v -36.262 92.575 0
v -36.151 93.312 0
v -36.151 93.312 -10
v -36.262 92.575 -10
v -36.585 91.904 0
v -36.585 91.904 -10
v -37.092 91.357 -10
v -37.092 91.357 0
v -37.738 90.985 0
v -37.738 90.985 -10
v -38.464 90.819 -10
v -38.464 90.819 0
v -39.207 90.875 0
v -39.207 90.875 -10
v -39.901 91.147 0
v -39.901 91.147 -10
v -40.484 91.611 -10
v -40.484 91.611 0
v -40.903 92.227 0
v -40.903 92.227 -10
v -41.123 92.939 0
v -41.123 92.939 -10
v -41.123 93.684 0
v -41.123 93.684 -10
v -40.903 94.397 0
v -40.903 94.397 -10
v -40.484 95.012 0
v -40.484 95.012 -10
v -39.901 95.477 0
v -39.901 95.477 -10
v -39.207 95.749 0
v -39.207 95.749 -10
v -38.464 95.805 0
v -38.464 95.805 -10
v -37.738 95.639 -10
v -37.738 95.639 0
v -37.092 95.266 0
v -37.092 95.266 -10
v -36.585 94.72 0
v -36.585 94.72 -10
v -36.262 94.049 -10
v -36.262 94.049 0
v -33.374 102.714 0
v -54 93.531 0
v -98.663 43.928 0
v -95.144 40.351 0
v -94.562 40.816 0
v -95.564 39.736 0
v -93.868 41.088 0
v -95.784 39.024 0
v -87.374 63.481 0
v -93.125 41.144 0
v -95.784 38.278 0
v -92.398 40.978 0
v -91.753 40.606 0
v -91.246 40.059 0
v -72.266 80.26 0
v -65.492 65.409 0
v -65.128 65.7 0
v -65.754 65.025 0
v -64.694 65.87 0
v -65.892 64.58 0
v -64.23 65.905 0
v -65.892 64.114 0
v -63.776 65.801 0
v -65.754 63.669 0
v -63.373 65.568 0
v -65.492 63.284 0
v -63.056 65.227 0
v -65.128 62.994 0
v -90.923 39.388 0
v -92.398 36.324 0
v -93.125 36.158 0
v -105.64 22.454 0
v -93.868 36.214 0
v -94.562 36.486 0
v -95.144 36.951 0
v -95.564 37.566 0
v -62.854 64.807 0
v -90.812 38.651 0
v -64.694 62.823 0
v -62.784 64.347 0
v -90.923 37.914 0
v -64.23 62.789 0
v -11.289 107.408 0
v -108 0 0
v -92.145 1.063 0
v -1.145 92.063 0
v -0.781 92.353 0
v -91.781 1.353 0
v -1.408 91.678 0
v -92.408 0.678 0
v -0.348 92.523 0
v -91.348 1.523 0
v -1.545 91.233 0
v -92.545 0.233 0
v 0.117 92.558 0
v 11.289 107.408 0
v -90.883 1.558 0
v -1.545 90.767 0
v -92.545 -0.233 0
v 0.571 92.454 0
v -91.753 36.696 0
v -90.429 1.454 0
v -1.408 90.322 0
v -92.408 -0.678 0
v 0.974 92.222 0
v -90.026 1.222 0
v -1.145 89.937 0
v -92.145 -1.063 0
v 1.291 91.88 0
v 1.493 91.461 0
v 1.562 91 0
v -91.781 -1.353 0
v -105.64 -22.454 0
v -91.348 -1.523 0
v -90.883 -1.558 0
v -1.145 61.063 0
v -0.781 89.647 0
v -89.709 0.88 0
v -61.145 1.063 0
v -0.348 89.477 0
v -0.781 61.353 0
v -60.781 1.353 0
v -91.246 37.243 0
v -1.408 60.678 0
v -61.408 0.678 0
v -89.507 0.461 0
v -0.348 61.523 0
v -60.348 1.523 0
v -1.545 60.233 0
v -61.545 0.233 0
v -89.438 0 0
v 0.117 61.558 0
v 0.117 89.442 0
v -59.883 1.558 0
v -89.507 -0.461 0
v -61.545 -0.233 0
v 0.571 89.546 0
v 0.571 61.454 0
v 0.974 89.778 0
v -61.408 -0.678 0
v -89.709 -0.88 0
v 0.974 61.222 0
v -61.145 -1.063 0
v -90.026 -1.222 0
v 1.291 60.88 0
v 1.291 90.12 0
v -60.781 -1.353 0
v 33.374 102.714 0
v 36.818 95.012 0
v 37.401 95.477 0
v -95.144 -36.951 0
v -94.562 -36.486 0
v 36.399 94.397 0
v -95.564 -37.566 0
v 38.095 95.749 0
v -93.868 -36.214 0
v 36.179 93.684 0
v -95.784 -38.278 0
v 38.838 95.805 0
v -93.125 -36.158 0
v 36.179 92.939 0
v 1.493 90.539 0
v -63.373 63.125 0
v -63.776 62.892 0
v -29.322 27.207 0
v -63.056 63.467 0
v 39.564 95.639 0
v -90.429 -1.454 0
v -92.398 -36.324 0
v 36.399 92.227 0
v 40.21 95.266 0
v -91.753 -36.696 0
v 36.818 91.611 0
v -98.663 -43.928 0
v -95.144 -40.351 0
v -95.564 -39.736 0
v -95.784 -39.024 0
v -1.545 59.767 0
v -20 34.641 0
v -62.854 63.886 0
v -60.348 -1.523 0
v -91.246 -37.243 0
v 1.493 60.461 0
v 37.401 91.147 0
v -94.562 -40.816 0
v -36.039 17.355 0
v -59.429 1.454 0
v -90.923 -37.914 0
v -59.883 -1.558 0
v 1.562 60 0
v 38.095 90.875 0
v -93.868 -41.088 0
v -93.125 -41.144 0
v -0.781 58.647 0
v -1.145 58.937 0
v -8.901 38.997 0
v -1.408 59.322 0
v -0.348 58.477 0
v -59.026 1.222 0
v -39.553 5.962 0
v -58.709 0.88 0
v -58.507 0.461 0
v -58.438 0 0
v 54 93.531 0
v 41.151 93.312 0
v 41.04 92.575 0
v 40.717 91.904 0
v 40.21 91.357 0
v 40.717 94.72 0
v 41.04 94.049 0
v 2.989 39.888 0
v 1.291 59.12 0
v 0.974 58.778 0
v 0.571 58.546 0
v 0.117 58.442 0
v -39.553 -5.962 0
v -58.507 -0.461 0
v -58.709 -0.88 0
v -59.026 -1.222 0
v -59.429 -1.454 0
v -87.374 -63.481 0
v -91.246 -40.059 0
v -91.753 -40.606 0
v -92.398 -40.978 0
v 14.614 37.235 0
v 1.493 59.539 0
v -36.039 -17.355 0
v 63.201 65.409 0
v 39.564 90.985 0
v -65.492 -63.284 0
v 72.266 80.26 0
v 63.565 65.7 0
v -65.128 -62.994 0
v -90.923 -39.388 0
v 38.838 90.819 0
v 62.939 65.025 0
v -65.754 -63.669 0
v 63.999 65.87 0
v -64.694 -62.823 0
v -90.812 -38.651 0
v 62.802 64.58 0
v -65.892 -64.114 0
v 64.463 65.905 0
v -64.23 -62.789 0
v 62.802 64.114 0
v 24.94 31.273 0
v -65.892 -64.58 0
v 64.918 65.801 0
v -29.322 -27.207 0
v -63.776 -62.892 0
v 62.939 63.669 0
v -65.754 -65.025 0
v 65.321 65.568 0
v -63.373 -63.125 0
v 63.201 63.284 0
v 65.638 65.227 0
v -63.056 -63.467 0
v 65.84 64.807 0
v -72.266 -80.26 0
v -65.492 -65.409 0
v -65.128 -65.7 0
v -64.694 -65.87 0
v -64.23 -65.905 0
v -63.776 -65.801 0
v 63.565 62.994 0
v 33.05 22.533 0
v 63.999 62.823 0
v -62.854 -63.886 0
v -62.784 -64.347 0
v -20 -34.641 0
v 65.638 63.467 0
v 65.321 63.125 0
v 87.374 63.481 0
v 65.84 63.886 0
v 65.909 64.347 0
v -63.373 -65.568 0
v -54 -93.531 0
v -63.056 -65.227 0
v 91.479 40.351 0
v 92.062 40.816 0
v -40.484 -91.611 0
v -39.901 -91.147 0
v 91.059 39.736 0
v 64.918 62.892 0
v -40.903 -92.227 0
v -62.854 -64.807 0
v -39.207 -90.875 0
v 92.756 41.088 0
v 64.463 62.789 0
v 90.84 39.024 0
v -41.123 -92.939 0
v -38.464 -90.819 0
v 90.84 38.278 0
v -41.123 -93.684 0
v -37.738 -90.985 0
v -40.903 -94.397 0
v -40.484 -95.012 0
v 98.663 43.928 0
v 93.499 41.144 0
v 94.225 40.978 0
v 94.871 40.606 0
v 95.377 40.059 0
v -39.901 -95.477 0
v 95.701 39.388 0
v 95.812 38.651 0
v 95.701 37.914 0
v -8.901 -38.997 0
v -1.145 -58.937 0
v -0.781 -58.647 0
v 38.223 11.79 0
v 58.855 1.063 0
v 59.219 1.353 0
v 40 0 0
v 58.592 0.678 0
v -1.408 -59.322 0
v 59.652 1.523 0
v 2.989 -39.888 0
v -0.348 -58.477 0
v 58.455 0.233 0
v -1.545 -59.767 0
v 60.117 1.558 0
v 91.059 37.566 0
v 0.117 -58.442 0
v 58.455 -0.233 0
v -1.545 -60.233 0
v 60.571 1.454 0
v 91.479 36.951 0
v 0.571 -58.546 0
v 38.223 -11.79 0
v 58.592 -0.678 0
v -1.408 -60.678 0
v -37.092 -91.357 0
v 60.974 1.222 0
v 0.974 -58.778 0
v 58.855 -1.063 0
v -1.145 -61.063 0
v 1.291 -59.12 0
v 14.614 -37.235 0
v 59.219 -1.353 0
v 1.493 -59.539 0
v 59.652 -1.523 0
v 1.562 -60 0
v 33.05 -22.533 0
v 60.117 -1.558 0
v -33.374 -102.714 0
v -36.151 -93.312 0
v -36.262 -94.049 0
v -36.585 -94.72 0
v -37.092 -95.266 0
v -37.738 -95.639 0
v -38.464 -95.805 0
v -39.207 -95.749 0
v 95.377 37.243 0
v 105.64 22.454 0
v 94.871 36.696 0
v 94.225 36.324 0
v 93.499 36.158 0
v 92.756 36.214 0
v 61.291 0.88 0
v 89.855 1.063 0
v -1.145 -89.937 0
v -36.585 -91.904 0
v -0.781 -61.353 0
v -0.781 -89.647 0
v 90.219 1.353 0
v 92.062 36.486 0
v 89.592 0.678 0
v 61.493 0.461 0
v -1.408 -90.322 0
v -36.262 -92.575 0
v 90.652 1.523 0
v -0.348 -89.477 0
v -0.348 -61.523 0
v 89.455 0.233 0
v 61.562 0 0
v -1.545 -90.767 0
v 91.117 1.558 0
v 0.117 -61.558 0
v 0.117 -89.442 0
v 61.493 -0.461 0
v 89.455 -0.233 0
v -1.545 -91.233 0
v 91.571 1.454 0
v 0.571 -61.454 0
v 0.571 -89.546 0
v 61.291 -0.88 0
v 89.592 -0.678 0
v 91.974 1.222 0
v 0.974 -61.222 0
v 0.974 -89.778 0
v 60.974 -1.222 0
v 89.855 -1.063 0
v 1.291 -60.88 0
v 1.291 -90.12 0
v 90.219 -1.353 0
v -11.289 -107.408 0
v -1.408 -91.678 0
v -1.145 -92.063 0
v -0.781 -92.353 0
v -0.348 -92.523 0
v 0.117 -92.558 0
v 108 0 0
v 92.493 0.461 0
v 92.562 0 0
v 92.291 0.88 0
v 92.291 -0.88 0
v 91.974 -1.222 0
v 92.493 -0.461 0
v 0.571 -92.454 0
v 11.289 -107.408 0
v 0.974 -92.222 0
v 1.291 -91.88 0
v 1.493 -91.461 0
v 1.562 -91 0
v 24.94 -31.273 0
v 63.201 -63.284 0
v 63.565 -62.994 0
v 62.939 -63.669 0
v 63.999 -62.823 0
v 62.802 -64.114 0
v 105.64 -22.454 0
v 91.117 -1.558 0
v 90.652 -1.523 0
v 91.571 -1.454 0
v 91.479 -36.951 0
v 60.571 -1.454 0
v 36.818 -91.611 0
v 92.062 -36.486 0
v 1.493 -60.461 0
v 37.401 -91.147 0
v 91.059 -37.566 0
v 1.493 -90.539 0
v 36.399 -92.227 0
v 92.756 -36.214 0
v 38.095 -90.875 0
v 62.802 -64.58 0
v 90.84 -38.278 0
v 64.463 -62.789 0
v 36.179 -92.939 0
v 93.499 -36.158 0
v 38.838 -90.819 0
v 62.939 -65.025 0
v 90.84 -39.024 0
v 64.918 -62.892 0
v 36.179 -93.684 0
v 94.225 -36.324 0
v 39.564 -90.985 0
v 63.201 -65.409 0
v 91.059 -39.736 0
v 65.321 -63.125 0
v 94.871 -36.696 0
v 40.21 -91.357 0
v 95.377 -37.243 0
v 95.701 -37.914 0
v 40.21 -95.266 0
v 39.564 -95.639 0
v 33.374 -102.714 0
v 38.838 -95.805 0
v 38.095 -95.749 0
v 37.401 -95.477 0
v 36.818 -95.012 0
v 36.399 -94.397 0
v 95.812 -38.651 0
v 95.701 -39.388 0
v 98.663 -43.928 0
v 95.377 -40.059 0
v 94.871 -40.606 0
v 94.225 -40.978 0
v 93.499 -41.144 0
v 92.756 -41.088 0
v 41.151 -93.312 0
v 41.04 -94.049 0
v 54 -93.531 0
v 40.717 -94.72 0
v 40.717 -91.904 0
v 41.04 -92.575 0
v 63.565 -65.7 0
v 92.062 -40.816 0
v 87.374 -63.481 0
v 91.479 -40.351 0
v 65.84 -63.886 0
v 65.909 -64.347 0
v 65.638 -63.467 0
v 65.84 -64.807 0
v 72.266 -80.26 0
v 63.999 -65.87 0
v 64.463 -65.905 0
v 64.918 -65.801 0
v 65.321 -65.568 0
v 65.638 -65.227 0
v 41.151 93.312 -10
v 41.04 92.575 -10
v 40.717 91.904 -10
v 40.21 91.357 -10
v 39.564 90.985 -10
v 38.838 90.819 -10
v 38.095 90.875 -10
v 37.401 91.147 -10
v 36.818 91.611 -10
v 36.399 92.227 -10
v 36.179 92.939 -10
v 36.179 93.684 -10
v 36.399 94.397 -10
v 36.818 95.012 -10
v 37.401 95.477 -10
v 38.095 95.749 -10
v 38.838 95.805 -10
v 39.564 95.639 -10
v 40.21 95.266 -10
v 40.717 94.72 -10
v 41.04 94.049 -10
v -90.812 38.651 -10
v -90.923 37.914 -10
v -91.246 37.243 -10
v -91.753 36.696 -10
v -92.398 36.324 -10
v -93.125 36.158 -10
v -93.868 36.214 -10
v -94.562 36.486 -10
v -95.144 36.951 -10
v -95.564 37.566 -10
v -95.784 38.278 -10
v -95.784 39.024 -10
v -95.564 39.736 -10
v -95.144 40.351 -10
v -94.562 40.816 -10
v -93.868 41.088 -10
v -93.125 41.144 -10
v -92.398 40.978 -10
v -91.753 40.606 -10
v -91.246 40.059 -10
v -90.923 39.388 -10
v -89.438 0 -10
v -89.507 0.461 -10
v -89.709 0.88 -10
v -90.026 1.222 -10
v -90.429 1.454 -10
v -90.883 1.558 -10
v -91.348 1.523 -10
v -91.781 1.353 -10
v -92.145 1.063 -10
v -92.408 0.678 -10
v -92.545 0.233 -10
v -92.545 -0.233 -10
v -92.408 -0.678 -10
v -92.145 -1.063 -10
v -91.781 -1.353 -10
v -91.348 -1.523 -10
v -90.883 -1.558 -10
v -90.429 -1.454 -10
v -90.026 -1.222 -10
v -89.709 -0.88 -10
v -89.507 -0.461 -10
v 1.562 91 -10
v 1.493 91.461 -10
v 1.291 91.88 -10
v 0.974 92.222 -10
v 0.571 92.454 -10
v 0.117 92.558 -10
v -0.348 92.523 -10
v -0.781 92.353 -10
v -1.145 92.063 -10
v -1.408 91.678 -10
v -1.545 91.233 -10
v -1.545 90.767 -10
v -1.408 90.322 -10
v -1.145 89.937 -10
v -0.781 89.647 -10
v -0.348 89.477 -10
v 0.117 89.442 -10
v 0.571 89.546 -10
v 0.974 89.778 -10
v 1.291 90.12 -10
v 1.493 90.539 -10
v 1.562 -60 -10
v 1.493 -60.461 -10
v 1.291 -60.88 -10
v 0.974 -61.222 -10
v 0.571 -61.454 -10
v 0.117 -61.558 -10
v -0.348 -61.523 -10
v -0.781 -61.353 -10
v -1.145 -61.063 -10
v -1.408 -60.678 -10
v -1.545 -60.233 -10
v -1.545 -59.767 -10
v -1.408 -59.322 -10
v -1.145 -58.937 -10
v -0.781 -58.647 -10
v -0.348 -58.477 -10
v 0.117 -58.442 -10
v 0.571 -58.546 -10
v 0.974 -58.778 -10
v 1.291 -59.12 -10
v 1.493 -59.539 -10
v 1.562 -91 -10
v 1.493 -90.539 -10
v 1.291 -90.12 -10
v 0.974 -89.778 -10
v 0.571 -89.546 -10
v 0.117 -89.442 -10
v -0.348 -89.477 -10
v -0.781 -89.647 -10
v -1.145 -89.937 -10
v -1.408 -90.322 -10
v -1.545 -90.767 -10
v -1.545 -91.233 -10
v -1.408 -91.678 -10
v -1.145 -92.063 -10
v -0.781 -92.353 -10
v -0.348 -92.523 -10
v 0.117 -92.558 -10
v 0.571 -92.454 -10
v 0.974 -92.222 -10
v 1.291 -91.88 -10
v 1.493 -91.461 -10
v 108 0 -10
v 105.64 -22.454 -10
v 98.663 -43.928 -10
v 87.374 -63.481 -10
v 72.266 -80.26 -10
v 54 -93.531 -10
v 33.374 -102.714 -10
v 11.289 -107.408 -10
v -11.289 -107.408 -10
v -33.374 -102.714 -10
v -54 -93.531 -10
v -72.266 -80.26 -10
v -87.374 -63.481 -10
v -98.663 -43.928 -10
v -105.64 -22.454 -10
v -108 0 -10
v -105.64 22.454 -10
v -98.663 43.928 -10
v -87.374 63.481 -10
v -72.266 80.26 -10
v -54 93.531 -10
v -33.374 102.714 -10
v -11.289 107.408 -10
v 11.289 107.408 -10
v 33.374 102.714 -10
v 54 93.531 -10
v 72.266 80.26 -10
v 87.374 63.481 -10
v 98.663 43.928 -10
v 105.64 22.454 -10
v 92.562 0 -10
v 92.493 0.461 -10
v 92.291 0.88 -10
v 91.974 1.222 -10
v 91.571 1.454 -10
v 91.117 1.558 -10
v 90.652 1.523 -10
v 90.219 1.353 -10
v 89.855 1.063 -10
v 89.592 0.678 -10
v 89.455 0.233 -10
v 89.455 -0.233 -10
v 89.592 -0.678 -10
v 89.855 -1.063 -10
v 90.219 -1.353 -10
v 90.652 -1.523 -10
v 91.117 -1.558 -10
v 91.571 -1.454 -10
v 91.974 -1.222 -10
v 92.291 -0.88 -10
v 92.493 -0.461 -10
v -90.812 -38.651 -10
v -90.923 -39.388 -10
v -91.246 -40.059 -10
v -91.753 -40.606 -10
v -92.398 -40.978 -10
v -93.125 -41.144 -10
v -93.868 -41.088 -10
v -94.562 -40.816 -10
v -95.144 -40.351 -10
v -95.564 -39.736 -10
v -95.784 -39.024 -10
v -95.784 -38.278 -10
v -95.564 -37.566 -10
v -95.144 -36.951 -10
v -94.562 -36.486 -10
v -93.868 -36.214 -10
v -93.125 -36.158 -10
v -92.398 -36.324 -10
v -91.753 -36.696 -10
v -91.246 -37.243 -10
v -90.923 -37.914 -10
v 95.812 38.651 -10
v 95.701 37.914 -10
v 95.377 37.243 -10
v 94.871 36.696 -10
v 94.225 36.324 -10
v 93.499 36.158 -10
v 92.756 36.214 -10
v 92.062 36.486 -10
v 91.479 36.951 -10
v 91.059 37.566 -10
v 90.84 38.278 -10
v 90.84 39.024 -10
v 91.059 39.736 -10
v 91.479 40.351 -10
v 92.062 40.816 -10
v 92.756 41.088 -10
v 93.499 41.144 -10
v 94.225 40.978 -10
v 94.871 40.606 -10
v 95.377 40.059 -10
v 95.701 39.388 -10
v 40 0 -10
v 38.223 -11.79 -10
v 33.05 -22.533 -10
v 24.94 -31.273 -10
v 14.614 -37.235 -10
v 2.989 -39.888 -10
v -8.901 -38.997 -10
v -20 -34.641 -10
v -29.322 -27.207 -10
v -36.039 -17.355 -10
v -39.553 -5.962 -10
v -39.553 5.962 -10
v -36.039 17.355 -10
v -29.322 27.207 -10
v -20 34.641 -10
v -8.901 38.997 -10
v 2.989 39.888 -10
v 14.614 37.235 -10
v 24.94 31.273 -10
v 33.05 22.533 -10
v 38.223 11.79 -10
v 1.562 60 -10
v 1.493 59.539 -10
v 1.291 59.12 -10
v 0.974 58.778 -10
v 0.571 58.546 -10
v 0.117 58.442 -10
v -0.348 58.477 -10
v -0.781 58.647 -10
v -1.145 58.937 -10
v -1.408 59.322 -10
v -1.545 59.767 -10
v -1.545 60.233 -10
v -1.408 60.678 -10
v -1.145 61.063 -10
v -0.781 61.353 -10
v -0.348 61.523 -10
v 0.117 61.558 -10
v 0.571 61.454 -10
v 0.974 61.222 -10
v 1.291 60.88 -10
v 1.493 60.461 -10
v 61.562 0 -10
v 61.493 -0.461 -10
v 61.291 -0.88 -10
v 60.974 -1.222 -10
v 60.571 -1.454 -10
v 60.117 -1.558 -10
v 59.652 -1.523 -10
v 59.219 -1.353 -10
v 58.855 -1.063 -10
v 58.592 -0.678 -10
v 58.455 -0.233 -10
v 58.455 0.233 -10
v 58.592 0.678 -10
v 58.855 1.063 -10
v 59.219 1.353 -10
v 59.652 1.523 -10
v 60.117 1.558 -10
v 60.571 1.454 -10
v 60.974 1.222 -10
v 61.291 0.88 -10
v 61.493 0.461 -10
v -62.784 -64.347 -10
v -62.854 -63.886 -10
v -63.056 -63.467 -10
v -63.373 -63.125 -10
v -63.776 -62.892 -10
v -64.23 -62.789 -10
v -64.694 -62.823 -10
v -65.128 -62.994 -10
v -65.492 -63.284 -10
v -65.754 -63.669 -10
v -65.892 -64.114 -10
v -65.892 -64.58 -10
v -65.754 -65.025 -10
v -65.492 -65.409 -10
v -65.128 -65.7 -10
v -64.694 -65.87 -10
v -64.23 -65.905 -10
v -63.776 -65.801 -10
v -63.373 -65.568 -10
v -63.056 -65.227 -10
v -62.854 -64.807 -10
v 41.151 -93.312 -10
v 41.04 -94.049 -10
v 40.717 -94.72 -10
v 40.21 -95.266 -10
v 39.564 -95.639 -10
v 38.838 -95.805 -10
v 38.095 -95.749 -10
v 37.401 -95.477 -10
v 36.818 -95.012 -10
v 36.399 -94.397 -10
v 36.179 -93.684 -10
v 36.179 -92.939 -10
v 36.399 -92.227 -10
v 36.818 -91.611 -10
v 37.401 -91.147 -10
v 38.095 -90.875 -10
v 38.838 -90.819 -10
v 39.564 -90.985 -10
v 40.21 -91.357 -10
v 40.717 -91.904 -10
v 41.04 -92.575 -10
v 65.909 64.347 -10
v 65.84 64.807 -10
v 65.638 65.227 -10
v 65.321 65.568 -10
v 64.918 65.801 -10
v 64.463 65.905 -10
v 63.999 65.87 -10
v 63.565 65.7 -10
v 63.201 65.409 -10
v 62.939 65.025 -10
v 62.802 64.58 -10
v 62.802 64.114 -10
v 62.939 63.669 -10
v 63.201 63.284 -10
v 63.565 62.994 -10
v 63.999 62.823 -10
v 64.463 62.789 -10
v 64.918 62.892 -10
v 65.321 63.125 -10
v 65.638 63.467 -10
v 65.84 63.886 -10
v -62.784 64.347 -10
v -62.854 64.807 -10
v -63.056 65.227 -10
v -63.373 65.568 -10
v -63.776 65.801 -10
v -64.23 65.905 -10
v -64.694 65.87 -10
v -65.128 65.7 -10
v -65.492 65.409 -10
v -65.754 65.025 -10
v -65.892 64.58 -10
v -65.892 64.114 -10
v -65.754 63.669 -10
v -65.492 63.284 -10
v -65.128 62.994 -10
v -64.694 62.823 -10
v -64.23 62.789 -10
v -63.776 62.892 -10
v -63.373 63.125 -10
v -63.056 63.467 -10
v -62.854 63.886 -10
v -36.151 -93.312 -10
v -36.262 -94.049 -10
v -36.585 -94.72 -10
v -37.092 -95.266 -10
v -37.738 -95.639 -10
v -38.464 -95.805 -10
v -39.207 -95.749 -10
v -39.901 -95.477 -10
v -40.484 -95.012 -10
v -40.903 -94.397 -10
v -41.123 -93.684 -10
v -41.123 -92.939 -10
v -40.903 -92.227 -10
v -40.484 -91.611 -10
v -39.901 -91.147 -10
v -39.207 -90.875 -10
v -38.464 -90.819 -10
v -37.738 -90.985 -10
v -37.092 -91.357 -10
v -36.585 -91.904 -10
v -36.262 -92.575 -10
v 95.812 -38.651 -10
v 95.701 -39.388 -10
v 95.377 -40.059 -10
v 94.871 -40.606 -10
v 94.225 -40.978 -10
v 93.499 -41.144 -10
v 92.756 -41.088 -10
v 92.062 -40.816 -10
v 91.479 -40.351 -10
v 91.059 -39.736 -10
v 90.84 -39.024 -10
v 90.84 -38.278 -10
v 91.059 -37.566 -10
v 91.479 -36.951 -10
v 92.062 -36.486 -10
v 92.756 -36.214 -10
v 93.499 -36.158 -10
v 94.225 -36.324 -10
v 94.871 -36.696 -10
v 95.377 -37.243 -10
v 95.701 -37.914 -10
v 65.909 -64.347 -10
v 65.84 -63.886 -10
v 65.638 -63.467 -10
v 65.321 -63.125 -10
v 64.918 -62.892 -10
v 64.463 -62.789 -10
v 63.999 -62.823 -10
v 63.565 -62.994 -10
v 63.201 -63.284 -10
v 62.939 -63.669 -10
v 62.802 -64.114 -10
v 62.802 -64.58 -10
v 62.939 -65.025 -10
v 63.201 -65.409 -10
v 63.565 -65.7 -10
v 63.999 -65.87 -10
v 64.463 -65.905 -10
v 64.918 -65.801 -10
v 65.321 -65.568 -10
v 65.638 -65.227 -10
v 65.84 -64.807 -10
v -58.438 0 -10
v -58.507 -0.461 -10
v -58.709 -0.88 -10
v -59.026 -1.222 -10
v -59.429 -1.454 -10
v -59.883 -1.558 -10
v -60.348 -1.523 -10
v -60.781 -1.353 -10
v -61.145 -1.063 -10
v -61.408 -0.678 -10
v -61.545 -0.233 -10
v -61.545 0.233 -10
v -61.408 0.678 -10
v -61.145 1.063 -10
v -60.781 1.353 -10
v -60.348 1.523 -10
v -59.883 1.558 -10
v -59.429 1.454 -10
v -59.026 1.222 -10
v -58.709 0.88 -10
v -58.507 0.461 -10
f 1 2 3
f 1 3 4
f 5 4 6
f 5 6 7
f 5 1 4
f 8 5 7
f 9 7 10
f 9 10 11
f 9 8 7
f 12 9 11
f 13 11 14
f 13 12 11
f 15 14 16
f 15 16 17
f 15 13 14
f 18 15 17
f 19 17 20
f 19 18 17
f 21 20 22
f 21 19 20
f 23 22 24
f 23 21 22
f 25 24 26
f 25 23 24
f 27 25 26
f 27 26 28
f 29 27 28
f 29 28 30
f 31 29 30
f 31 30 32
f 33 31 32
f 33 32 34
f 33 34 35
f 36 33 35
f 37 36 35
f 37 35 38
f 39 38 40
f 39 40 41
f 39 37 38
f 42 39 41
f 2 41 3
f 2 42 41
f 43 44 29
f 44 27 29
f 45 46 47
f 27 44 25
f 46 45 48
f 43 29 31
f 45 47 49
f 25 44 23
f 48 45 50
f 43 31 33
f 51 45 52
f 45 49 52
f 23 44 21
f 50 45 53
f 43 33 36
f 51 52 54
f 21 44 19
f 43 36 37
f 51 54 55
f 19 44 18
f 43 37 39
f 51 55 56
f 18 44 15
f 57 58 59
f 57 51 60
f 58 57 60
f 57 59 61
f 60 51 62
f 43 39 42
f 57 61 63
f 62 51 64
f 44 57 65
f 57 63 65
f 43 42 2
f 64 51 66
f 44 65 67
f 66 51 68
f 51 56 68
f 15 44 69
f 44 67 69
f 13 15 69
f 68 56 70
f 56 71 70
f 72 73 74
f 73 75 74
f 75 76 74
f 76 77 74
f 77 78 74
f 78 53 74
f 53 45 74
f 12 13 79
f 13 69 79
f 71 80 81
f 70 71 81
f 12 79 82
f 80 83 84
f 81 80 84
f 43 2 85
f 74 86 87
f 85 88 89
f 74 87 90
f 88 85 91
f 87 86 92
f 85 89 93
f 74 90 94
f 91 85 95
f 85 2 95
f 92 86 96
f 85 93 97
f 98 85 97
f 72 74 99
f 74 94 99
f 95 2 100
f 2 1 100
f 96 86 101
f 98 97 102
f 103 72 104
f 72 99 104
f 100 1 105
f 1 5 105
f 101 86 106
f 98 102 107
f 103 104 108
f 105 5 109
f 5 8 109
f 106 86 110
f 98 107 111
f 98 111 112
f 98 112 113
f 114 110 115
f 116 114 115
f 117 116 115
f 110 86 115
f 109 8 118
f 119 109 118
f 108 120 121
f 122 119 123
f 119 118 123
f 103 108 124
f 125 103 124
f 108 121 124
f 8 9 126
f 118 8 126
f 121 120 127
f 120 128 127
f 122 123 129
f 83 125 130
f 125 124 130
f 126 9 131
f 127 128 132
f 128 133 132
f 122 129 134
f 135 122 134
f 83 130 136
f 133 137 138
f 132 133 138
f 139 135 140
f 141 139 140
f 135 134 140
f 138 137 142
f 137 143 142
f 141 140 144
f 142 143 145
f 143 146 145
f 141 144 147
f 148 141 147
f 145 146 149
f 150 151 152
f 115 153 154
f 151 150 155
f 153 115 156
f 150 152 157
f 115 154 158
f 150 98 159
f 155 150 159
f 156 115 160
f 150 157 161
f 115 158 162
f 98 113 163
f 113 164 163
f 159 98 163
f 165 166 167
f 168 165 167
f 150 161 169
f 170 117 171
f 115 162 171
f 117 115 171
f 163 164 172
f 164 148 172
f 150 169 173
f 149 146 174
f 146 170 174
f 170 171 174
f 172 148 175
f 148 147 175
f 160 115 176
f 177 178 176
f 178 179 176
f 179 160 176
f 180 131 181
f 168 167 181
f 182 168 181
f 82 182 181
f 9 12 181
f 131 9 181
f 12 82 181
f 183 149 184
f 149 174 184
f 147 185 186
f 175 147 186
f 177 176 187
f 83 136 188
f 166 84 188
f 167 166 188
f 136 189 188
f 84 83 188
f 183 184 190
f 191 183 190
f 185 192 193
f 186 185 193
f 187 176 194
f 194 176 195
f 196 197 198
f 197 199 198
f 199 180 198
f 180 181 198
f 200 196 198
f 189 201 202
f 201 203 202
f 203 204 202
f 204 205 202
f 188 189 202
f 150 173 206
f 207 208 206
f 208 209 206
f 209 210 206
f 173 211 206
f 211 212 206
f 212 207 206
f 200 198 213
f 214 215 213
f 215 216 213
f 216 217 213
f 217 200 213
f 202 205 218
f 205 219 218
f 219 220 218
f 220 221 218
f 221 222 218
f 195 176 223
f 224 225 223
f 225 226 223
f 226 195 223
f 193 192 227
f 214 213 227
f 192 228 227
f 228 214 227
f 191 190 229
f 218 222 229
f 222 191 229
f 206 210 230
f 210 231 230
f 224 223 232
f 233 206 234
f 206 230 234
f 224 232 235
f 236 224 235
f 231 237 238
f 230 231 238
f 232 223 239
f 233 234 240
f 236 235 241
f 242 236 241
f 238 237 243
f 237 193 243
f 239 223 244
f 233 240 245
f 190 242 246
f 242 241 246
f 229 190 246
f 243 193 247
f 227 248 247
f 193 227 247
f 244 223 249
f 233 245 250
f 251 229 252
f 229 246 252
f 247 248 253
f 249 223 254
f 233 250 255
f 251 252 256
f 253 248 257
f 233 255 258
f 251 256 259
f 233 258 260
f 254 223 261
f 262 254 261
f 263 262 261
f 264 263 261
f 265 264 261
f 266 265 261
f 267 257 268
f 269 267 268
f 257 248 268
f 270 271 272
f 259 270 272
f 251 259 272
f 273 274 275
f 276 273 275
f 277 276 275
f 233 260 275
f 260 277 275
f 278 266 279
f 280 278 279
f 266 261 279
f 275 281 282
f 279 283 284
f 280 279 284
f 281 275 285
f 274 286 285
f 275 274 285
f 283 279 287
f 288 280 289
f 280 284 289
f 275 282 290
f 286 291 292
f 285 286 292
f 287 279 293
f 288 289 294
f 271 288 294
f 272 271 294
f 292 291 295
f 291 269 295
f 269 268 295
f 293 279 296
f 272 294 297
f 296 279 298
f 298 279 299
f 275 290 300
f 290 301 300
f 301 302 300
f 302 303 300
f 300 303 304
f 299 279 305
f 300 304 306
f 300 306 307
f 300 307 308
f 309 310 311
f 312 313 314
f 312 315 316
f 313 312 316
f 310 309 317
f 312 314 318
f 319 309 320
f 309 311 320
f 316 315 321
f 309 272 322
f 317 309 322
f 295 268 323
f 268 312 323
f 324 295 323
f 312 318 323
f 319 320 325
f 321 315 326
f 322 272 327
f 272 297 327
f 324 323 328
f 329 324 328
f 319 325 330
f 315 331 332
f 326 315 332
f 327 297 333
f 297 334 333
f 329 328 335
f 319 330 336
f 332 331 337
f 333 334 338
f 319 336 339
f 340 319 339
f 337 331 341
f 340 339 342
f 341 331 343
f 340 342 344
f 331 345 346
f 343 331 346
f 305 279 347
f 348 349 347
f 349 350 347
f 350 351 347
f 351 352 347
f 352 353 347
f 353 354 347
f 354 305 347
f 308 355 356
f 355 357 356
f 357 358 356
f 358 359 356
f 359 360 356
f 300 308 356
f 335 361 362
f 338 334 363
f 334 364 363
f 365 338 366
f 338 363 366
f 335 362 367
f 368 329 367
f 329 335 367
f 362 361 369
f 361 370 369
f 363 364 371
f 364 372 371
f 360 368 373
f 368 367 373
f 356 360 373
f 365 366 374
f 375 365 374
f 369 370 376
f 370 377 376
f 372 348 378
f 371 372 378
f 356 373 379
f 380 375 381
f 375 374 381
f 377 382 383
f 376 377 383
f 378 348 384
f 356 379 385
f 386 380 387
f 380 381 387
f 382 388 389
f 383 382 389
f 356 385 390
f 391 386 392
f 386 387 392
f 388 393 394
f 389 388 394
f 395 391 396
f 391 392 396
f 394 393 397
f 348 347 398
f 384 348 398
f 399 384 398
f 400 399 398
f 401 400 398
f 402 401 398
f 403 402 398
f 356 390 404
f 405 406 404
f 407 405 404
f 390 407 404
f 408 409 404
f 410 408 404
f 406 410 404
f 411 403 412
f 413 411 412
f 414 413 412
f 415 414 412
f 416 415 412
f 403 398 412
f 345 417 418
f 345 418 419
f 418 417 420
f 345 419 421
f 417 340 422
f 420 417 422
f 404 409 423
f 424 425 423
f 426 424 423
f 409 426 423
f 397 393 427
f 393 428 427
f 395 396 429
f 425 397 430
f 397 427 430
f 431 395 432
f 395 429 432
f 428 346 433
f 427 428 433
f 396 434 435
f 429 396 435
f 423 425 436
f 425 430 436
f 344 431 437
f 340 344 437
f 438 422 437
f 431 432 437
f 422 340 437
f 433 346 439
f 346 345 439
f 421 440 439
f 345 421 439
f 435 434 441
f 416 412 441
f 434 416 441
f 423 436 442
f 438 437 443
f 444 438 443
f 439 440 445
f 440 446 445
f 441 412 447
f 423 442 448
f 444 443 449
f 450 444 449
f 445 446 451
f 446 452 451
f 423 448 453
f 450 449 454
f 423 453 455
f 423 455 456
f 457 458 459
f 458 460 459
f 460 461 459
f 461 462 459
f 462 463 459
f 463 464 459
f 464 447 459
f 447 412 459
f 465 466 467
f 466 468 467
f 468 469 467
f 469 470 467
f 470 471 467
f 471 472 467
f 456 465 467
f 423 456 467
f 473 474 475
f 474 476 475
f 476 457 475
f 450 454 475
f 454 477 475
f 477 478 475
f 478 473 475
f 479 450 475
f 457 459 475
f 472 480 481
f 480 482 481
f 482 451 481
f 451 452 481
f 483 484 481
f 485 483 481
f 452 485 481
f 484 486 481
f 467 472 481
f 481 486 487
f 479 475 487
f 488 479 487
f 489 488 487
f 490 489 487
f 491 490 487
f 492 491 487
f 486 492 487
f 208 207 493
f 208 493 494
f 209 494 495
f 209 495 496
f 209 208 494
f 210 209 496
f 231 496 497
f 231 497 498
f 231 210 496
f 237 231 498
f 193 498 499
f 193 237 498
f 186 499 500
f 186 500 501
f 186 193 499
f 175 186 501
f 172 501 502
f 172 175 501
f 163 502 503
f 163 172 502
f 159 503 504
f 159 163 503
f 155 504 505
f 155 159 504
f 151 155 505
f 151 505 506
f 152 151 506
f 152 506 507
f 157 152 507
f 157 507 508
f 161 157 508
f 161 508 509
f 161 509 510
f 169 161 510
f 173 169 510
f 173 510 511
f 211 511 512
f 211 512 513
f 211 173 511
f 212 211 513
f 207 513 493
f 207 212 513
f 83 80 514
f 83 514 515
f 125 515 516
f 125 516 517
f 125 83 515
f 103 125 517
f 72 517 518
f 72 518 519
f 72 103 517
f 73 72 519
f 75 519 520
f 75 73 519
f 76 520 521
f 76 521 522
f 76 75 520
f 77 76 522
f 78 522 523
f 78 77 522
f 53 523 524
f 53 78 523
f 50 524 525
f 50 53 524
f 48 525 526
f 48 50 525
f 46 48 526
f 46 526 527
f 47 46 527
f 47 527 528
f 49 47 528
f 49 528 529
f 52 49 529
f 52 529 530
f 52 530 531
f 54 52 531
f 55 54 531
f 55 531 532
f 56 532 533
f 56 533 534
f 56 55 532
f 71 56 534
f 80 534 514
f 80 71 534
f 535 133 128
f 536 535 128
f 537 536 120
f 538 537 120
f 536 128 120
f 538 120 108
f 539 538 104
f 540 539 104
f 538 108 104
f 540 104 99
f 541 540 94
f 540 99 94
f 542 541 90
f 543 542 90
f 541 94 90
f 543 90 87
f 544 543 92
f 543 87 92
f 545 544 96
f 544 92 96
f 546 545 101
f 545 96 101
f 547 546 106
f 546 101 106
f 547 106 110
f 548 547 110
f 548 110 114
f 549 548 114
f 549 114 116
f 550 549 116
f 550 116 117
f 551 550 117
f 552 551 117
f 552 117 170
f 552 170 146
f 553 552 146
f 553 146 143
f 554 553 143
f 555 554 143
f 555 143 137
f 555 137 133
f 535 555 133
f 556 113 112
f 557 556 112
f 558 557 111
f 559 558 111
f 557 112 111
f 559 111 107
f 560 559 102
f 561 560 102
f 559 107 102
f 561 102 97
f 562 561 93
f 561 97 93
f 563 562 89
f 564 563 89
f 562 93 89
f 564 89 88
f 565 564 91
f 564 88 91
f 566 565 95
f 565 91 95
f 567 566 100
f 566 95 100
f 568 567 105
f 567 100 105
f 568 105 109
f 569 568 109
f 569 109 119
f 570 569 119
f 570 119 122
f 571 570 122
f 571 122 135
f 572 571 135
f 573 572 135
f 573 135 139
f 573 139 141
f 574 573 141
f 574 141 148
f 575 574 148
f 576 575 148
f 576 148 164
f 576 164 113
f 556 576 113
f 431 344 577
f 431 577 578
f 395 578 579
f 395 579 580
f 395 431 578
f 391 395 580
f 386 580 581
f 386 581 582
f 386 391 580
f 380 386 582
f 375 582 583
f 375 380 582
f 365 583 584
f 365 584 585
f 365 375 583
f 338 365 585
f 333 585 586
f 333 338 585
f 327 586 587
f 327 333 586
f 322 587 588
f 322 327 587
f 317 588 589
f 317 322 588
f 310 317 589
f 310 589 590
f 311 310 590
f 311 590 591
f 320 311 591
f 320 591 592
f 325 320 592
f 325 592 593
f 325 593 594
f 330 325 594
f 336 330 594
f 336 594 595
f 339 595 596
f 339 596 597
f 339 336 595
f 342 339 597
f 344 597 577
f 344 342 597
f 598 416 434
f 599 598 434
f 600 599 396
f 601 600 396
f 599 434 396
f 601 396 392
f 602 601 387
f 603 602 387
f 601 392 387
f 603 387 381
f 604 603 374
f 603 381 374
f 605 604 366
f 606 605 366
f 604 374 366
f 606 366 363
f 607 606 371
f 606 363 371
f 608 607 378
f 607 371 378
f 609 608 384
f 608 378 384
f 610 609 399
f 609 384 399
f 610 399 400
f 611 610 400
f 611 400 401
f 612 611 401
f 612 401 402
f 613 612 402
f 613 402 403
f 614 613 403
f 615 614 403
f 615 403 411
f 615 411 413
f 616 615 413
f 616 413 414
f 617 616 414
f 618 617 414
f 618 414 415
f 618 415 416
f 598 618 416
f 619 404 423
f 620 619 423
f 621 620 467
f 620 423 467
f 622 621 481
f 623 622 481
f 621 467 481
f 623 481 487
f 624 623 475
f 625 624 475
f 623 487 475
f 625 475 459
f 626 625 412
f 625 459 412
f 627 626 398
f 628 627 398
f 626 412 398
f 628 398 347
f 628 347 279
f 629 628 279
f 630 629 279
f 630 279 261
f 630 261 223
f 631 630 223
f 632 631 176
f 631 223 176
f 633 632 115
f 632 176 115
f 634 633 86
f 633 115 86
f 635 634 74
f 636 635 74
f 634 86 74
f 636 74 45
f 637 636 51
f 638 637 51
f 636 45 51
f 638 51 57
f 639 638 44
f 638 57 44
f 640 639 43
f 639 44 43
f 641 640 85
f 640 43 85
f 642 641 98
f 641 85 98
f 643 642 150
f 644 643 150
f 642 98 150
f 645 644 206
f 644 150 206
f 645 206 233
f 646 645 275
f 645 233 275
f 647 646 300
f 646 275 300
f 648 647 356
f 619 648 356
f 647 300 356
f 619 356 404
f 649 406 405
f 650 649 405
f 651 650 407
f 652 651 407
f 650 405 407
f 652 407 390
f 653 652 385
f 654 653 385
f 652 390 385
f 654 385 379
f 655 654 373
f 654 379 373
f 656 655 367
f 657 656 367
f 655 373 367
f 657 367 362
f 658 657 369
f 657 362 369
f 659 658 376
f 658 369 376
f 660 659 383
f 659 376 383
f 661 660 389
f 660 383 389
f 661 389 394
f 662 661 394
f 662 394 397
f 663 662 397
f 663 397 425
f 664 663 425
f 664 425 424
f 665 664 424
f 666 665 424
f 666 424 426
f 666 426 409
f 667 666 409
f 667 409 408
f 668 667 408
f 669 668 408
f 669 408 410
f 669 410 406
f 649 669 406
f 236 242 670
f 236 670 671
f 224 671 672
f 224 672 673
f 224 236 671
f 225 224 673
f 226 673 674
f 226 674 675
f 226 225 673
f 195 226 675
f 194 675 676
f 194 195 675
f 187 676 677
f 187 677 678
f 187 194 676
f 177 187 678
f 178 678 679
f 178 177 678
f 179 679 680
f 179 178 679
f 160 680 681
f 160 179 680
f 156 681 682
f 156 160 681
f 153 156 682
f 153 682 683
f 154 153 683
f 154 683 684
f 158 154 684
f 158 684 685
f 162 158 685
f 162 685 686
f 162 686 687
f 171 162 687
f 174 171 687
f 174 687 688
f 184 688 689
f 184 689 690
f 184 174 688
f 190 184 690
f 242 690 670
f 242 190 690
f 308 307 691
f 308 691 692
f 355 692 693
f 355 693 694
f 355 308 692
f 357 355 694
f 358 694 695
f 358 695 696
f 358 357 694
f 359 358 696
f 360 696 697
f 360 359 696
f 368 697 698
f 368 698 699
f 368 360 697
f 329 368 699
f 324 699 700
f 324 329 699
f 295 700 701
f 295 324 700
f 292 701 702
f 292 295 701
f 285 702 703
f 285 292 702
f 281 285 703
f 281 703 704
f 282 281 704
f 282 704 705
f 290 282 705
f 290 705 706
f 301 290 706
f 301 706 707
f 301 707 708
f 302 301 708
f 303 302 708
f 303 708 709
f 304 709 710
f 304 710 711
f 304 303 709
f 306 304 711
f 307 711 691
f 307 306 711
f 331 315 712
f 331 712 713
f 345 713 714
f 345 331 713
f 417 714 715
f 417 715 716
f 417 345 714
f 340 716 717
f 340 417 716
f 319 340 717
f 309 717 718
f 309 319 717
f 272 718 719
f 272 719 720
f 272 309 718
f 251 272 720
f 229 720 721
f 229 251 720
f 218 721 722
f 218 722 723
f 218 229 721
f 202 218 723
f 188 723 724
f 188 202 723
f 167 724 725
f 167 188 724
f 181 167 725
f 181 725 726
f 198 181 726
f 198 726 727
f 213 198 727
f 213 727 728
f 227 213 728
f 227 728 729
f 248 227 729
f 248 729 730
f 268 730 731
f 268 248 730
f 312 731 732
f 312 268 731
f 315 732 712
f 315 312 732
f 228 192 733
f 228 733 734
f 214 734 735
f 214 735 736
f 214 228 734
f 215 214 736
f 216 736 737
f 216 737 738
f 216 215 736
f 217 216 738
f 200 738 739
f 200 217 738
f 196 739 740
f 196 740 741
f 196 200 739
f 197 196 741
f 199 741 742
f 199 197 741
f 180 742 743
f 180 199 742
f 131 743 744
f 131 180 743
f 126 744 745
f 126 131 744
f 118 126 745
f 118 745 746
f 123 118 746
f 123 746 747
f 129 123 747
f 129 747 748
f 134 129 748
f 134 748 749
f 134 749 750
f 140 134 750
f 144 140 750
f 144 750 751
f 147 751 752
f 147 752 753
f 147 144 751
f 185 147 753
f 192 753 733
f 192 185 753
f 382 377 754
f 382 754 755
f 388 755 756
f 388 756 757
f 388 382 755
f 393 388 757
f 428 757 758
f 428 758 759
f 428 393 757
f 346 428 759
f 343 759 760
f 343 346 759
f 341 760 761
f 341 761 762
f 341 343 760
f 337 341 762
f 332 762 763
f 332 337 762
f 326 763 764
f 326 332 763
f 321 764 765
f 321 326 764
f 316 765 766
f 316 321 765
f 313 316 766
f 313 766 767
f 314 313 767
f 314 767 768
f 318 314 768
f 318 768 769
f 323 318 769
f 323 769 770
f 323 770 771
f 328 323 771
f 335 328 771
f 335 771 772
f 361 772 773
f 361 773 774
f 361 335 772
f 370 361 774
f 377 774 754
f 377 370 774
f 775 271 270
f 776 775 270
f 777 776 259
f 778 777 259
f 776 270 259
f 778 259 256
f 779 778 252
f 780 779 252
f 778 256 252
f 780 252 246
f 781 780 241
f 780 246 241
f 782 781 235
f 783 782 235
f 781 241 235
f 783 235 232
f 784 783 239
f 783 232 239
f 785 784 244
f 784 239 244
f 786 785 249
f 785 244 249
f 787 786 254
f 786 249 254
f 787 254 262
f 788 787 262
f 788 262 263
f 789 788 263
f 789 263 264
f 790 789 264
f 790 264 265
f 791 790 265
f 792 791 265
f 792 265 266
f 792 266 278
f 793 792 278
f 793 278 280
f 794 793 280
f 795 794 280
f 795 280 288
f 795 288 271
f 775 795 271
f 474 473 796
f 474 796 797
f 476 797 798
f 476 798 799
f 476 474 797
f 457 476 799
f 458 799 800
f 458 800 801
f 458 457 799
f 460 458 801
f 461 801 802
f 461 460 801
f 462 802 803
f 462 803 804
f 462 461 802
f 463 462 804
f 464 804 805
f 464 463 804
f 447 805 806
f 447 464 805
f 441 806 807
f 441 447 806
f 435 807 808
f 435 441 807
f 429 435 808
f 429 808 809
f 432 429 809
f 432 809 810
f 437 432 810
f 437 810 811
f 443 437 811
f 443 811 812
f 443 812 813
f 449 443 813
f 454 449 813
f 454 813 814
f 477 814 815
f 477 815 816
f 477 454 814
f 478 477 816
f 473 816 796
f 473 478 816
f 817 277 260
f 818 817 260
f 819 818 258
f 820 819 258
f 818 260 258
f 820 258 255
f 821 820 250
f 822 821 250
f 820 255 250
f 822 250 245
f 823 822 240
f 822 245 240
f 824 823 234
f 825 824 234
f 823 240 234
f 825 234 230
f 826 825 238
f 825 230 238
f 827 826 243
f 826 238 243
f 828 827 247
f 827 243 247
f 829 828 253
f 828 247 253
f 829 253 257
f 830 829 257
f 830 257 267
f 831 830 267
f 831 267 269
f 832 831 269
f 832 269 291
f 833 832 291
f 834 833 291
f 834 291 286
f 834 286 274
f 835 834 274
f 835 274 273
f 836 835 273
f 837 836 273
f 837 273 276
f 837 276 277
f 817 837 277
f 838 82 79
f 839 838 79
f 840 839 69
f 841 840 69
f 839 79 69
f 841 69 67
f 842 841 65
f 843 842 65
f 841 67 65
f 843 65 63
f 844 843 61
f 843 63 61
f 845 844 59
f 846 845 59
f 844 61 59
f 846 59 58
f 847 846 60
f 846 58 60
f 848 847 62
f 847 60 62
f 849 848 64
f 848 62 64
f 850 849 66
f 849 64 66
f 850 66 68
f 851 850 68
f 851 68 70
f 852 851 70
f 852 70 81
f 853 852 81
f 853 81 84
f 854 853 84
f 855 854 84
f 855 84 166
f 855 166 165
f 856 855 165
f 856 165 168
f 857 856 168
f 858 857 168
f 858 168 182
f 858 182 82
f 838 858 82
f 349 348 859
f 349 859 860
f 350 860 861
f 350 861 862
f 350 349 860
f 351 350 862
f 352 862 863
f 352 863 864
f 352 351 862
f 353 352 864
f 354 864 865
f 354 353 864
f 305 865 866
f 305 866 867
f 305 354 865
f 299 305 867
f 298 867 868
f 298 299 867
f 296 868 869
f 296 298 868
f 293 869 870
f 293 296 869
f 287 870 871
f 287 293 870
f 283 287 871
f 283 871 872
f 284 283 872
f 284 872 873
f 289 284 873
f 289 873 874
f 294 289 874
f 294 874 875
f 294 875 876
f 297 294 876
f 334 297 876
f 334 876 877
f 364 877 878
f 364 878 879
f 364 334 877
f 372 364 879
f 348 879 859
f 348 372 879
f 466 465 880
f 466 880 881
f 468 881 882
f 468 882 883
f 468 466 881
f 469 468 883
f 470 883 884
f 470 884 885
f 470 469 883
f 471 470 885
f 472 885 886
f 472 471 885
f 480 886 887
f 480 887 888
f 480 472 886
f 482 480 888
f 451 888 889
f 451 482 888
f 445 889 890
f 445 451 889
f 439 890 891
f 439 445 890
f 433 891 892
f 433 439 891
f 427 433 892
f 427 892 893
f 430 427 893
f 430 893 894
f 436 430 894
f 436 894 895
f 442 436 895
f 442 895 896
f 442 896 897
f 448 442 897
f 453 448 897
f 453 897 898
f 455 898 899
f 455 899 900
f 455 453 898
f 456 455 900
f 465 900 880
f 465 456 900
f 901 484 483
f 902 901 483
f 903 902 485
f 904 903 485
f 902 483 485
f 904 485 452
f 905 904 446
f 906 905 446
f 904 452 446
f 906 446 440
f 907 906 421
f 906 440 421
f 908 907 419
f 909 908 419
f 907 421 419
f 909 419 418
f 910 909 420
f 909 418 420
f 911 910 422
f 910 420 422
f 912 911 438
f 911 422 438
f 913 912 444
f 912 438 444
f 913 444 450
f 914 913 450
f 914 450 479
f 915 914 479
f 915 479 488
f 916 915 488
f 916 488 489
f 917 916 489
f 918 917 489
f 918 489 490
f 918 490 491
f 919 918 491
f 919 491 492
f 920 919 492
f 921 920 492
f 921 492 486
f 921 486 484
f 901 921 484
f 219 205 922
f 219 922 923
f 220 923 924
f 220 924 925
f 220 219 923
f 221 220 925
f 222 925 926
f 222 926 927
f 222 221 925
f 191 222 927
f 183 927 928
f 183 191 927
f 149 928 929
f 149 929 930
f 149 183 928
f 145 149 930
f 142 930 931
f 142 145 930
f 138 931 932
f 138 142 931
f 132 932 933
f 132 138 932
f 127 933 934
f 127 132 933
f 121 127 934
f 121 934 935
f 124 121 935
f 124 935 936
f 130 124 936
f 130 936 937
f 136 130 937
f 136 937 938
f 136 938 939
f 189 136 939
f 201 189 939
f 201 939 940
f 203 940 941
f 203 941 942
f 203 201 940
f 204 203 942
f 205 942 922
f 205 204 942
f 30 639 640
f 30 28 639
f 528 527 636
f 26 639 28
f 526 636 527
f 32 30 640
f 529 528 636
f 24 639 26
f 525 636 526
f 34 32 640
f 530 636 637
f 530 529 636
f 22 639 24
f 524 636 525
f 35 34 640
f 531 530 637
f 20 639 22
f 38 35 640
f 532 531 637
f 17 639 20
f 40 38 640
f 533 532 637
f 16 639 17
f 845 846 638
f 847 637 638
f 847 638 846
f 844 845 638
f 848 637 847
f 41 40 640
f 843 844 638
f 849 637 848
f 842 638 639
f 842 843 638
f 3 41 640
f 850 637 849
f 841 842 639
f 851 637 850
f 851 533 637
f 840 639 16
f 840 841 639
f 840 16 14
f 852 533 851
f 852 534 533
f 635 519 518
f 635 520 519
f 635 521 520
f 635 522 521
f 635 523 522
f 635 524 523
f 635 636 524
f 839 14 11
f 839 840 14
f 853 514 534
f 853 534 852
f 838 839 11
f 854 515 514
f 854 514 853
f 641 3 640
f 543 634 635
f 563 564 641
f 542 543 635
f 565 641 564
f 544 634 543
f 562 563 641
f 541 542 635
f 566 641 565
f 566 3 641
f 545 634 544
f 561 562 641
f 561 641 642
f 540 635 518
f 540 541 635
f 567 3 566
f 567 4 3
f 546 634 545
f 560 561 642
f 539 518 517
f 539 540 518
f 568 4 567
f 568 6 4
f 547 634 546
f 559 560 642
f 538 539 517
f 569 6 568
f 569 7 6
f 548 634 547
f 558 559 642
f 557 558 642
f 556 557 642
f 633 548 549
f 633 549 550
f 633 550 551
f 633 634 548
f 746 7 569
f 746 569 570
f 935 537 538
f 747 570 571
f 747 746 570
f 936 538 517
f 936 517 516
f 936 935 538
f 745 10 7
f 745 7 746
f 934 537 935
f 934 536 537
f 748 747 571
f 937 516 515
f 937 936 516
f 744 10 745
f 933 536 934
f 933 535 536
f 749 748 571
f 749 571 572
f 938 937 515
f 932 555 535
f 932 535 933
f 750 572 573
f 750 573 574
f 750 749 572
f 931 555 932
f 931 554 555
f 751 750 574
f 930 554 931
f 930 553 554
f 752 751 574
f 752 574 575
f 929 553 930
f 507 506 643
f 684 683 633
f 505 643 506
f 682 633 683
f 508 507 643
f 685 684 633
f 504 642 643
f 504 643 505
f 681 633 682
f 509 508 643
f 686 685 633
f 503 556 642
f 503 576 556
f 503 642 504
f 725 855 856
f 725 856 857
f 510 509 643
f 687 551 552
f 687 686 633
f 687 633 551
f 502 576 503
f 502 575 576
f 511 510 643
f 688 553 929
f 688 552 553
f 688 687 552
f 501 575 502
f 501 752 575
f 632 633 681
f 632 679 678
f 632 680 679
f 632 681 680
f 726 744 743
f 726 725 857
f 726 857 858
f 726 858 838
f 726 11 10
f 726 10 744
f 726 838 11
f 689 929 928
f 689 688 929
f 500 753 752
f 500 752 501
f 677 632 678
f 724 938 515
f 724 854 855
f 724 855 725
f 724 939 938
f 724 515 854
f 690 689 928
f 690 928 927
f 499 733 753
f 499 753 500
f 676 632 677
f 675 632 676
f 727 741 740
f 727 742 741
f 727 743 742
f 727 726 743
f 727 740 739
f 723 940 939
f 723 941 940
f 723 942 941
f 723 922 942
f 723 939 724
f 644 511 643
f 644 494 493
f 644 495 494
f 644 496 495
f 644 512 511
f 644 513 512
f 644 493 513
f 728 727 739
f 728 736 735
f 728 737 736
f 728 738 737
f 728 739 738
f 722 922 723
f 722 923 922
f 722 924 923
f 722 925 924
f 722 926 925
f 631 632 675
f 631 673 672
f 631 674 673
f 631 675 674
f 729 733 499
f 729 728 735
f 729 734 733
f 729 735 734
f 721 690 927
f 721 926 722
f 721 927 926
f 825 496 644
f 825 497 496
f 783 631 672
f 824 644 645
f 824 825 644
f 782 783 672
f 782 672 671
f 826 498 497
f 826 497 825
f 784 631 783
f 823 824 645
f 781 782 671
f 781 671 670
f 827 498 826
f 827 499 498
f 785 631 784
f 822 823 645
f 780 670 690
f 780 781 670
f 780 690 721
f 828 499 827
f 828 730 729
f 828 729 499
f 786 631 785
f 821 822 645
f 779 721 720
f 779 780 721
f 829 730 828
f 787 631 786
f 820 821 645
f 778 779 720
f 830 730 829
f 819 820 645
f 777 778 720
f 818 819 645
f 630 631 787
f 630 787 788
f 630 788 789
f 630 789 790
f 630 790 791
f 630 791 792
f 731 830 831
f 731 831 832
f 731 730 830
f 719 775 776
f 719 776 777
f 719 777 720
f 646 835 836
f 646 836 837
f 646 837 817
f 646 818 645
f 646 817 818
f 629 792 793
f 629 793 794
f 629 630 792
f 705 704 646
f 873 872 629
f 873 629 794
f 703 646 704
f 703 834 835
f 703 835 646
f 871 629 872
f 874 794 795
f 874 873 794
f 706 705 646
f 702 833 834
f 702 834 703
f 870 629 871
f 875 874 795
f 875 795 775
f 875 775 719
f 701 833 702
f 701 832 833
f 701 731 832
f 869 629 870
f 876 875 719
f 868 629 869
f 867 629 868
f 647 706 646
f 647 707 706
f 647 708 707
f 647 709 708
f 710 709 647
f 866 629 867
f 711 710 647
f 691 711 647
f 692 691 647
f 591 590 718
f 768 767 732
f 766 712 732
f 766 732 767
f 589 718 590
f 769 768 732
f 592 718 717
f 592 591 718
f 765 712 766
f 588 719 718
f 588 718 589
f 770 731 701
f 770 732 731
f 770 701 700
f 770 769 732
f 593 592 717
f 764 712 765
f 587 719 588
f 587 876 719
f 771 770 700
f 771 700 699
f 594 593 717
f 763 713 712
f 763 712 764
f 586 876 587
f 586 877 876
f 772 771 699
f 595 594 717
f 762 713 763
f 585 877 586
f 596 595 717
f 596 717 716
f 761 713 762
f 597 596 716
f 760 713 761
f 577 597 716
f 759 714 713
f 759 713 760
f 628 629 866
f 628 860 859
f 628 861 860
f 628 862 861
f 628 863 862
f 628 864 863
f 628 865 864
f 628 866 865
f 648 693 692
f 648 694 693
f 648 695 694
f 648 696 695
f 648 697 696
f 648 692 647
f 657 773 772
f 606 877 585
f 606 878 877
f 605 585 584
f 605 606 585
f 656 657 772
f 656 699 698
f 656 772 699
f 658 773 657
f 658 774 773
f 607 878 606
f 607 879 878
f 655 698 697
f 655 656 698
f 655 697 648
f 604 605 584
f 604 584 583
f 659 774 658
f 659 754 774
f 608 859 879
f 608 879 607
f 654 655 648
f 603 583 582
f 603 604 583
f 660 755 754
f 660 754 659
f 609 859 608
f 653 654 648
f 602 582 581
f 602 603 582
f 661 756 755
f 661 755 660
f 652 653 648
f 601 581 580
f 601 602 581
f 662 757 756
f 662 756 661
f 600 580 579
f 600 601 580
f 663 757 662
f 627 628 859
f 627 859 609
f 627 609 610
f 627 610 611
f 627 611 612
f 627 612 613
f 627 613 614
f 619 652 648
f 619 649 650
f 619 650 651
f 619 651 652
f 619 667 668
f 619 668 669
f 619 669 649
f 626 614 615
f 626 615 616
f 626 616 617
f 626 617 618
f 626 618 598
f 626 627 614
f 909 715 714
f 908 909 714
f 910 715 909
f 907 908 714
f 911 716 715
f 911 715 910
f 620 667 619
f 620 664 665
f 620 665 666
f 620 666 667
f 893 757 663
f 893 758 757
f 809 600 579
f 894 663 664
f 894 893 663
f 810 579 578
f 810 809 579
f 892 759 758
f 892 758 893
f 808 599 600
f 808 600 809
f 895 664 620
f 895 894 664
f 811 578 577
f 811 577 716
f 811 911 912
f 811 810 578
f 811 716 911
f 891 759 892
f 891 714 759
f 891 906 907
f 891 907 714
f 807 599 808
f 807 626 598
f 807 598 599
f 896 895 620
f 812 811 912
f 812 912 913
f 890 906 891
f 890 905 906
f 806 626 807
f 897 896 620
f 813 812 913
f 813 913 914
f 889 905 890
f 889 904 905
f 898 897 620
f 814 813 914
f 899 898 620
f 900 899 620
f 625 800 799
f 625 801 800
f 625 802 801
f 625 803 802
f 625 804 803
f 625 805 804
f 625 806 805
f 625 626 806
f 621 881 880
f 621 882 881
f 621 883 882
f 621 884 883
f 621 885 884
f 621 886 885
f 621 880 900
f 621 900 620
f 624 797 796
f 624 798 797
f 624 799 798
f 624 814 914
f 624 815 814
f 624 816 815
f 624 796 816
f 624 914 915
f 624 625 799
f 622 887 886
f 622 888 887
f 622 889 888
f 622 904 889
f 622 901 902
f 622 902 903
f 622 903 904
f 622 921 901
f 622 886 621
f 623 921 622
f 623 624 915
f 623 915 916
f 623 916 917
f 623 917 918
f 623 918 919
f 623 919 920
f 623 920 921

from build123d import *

# Parameters (mm, degrees)
SKETCH001_R       = 108
SKETCH001_R_2     = 40
SKETCH001_R_3     = 2.5
SKETCH001_R_4     = 1.5625
PAD_DEPTH         = 10
SKETCH_R          = 1.5625
POCKET_DEPTH      = 10.001
POCKET_DEPTH_BACK = 0.001


with BuildPart() as part:
    # Sketch001 → Pad (new body)
    with BuildSketch(Plane(origin=(0, 0, 0), x_dir=(1, 0, 0), z_dir=(0, 0, -1))):
        Circle(SKETCH001_R)
        Circle(SKETCH001_R_2, mode=Mode.SUBTRACT)
        with Locations((38.651027, 93.311833)):
            Circle(SKETCH001_R_3, mode=Mode.SUBTRACT)
        with Locations((93.311833, 38.651027)):
            Circle(SKETCH001_R_3, mode=Mode.SUBTRACT)
        with Locations((93.311833, -38.651027)):
            Circle(SKETCH001_R_3, mode=Mode.SUBTRACT)
        with Locations((38.651027, -93.311833)):
            Circle(SKETCH001_R_3, mode=Mode.SUBTRACT)
        with Locations((-38.651027, 93.311833)):
            Circle(SKETCH001_R_3, mode=Mode.SUBTRACT)
        with Locations((-93.311833, 38.651027)):
            Circle(SKETCH001_R_3, mode=Mode.SUBTRACT)
        with Locations((-93.311833, -38.651027)):
            Circle(SKETCH001_R_3, mode=Mode.SUBTRACT)
        with Locations((-38.651027, -93.311833)):
            Circle(SKETCH001_R_3, mode=Mode.SUBTRACT)
        with Locations((0, 60)):
            Circle(SKETCH001_R_4, mode=Mode.SUBTRACT)
        with Locations((-60, 0)):
            Circle(SKETCH001_R_4, mode=Mode.SUBTRACT)
        with Locations((0, -60)):
            Circle(SKETCH001_R_4, mode=Mode.SUBTRACT)
        with Locations((60, 0)):
            Circle(SKETCH001_R_4, mode=Mode.SUBTRACT)
    extrude(amount=PAD_DEPTH)

    # Sketch → Pocket (cut, two sides)
    with BuildSketch(Plane.XY) as pocket_sk:
        with Locations((64.346717, 64.346717)):
            Circle(SKETCH_R)
        with Locations((0, 91)):
            Circle(SKETCH_R)
        with Locations((91, 0)):
            Circle(SKETCH_R)
        with Locations((64.346717, -64.346717)):
            Circle(SKETCH_R)
        with Locations((0, -91)):
            Circle(SKETCH_R)
        with Locations((-91, 0)):
            Circle(SKETCH_R)
        with Locations((-64.346717, -64.346717)):
            Circle(SKETCH_R)
        with Locations((-64.346717, 64.346717)):
            Circle(SKETCH_R)
    extrude(amount=-POCKET_DEPTH, mode=Mode.SUBTRACT)
    extrude(pocket_sk.sketch, amount=POCKET_DEPTH_BACK, mode=Mode.SUBTRACT)


solid = part.part
